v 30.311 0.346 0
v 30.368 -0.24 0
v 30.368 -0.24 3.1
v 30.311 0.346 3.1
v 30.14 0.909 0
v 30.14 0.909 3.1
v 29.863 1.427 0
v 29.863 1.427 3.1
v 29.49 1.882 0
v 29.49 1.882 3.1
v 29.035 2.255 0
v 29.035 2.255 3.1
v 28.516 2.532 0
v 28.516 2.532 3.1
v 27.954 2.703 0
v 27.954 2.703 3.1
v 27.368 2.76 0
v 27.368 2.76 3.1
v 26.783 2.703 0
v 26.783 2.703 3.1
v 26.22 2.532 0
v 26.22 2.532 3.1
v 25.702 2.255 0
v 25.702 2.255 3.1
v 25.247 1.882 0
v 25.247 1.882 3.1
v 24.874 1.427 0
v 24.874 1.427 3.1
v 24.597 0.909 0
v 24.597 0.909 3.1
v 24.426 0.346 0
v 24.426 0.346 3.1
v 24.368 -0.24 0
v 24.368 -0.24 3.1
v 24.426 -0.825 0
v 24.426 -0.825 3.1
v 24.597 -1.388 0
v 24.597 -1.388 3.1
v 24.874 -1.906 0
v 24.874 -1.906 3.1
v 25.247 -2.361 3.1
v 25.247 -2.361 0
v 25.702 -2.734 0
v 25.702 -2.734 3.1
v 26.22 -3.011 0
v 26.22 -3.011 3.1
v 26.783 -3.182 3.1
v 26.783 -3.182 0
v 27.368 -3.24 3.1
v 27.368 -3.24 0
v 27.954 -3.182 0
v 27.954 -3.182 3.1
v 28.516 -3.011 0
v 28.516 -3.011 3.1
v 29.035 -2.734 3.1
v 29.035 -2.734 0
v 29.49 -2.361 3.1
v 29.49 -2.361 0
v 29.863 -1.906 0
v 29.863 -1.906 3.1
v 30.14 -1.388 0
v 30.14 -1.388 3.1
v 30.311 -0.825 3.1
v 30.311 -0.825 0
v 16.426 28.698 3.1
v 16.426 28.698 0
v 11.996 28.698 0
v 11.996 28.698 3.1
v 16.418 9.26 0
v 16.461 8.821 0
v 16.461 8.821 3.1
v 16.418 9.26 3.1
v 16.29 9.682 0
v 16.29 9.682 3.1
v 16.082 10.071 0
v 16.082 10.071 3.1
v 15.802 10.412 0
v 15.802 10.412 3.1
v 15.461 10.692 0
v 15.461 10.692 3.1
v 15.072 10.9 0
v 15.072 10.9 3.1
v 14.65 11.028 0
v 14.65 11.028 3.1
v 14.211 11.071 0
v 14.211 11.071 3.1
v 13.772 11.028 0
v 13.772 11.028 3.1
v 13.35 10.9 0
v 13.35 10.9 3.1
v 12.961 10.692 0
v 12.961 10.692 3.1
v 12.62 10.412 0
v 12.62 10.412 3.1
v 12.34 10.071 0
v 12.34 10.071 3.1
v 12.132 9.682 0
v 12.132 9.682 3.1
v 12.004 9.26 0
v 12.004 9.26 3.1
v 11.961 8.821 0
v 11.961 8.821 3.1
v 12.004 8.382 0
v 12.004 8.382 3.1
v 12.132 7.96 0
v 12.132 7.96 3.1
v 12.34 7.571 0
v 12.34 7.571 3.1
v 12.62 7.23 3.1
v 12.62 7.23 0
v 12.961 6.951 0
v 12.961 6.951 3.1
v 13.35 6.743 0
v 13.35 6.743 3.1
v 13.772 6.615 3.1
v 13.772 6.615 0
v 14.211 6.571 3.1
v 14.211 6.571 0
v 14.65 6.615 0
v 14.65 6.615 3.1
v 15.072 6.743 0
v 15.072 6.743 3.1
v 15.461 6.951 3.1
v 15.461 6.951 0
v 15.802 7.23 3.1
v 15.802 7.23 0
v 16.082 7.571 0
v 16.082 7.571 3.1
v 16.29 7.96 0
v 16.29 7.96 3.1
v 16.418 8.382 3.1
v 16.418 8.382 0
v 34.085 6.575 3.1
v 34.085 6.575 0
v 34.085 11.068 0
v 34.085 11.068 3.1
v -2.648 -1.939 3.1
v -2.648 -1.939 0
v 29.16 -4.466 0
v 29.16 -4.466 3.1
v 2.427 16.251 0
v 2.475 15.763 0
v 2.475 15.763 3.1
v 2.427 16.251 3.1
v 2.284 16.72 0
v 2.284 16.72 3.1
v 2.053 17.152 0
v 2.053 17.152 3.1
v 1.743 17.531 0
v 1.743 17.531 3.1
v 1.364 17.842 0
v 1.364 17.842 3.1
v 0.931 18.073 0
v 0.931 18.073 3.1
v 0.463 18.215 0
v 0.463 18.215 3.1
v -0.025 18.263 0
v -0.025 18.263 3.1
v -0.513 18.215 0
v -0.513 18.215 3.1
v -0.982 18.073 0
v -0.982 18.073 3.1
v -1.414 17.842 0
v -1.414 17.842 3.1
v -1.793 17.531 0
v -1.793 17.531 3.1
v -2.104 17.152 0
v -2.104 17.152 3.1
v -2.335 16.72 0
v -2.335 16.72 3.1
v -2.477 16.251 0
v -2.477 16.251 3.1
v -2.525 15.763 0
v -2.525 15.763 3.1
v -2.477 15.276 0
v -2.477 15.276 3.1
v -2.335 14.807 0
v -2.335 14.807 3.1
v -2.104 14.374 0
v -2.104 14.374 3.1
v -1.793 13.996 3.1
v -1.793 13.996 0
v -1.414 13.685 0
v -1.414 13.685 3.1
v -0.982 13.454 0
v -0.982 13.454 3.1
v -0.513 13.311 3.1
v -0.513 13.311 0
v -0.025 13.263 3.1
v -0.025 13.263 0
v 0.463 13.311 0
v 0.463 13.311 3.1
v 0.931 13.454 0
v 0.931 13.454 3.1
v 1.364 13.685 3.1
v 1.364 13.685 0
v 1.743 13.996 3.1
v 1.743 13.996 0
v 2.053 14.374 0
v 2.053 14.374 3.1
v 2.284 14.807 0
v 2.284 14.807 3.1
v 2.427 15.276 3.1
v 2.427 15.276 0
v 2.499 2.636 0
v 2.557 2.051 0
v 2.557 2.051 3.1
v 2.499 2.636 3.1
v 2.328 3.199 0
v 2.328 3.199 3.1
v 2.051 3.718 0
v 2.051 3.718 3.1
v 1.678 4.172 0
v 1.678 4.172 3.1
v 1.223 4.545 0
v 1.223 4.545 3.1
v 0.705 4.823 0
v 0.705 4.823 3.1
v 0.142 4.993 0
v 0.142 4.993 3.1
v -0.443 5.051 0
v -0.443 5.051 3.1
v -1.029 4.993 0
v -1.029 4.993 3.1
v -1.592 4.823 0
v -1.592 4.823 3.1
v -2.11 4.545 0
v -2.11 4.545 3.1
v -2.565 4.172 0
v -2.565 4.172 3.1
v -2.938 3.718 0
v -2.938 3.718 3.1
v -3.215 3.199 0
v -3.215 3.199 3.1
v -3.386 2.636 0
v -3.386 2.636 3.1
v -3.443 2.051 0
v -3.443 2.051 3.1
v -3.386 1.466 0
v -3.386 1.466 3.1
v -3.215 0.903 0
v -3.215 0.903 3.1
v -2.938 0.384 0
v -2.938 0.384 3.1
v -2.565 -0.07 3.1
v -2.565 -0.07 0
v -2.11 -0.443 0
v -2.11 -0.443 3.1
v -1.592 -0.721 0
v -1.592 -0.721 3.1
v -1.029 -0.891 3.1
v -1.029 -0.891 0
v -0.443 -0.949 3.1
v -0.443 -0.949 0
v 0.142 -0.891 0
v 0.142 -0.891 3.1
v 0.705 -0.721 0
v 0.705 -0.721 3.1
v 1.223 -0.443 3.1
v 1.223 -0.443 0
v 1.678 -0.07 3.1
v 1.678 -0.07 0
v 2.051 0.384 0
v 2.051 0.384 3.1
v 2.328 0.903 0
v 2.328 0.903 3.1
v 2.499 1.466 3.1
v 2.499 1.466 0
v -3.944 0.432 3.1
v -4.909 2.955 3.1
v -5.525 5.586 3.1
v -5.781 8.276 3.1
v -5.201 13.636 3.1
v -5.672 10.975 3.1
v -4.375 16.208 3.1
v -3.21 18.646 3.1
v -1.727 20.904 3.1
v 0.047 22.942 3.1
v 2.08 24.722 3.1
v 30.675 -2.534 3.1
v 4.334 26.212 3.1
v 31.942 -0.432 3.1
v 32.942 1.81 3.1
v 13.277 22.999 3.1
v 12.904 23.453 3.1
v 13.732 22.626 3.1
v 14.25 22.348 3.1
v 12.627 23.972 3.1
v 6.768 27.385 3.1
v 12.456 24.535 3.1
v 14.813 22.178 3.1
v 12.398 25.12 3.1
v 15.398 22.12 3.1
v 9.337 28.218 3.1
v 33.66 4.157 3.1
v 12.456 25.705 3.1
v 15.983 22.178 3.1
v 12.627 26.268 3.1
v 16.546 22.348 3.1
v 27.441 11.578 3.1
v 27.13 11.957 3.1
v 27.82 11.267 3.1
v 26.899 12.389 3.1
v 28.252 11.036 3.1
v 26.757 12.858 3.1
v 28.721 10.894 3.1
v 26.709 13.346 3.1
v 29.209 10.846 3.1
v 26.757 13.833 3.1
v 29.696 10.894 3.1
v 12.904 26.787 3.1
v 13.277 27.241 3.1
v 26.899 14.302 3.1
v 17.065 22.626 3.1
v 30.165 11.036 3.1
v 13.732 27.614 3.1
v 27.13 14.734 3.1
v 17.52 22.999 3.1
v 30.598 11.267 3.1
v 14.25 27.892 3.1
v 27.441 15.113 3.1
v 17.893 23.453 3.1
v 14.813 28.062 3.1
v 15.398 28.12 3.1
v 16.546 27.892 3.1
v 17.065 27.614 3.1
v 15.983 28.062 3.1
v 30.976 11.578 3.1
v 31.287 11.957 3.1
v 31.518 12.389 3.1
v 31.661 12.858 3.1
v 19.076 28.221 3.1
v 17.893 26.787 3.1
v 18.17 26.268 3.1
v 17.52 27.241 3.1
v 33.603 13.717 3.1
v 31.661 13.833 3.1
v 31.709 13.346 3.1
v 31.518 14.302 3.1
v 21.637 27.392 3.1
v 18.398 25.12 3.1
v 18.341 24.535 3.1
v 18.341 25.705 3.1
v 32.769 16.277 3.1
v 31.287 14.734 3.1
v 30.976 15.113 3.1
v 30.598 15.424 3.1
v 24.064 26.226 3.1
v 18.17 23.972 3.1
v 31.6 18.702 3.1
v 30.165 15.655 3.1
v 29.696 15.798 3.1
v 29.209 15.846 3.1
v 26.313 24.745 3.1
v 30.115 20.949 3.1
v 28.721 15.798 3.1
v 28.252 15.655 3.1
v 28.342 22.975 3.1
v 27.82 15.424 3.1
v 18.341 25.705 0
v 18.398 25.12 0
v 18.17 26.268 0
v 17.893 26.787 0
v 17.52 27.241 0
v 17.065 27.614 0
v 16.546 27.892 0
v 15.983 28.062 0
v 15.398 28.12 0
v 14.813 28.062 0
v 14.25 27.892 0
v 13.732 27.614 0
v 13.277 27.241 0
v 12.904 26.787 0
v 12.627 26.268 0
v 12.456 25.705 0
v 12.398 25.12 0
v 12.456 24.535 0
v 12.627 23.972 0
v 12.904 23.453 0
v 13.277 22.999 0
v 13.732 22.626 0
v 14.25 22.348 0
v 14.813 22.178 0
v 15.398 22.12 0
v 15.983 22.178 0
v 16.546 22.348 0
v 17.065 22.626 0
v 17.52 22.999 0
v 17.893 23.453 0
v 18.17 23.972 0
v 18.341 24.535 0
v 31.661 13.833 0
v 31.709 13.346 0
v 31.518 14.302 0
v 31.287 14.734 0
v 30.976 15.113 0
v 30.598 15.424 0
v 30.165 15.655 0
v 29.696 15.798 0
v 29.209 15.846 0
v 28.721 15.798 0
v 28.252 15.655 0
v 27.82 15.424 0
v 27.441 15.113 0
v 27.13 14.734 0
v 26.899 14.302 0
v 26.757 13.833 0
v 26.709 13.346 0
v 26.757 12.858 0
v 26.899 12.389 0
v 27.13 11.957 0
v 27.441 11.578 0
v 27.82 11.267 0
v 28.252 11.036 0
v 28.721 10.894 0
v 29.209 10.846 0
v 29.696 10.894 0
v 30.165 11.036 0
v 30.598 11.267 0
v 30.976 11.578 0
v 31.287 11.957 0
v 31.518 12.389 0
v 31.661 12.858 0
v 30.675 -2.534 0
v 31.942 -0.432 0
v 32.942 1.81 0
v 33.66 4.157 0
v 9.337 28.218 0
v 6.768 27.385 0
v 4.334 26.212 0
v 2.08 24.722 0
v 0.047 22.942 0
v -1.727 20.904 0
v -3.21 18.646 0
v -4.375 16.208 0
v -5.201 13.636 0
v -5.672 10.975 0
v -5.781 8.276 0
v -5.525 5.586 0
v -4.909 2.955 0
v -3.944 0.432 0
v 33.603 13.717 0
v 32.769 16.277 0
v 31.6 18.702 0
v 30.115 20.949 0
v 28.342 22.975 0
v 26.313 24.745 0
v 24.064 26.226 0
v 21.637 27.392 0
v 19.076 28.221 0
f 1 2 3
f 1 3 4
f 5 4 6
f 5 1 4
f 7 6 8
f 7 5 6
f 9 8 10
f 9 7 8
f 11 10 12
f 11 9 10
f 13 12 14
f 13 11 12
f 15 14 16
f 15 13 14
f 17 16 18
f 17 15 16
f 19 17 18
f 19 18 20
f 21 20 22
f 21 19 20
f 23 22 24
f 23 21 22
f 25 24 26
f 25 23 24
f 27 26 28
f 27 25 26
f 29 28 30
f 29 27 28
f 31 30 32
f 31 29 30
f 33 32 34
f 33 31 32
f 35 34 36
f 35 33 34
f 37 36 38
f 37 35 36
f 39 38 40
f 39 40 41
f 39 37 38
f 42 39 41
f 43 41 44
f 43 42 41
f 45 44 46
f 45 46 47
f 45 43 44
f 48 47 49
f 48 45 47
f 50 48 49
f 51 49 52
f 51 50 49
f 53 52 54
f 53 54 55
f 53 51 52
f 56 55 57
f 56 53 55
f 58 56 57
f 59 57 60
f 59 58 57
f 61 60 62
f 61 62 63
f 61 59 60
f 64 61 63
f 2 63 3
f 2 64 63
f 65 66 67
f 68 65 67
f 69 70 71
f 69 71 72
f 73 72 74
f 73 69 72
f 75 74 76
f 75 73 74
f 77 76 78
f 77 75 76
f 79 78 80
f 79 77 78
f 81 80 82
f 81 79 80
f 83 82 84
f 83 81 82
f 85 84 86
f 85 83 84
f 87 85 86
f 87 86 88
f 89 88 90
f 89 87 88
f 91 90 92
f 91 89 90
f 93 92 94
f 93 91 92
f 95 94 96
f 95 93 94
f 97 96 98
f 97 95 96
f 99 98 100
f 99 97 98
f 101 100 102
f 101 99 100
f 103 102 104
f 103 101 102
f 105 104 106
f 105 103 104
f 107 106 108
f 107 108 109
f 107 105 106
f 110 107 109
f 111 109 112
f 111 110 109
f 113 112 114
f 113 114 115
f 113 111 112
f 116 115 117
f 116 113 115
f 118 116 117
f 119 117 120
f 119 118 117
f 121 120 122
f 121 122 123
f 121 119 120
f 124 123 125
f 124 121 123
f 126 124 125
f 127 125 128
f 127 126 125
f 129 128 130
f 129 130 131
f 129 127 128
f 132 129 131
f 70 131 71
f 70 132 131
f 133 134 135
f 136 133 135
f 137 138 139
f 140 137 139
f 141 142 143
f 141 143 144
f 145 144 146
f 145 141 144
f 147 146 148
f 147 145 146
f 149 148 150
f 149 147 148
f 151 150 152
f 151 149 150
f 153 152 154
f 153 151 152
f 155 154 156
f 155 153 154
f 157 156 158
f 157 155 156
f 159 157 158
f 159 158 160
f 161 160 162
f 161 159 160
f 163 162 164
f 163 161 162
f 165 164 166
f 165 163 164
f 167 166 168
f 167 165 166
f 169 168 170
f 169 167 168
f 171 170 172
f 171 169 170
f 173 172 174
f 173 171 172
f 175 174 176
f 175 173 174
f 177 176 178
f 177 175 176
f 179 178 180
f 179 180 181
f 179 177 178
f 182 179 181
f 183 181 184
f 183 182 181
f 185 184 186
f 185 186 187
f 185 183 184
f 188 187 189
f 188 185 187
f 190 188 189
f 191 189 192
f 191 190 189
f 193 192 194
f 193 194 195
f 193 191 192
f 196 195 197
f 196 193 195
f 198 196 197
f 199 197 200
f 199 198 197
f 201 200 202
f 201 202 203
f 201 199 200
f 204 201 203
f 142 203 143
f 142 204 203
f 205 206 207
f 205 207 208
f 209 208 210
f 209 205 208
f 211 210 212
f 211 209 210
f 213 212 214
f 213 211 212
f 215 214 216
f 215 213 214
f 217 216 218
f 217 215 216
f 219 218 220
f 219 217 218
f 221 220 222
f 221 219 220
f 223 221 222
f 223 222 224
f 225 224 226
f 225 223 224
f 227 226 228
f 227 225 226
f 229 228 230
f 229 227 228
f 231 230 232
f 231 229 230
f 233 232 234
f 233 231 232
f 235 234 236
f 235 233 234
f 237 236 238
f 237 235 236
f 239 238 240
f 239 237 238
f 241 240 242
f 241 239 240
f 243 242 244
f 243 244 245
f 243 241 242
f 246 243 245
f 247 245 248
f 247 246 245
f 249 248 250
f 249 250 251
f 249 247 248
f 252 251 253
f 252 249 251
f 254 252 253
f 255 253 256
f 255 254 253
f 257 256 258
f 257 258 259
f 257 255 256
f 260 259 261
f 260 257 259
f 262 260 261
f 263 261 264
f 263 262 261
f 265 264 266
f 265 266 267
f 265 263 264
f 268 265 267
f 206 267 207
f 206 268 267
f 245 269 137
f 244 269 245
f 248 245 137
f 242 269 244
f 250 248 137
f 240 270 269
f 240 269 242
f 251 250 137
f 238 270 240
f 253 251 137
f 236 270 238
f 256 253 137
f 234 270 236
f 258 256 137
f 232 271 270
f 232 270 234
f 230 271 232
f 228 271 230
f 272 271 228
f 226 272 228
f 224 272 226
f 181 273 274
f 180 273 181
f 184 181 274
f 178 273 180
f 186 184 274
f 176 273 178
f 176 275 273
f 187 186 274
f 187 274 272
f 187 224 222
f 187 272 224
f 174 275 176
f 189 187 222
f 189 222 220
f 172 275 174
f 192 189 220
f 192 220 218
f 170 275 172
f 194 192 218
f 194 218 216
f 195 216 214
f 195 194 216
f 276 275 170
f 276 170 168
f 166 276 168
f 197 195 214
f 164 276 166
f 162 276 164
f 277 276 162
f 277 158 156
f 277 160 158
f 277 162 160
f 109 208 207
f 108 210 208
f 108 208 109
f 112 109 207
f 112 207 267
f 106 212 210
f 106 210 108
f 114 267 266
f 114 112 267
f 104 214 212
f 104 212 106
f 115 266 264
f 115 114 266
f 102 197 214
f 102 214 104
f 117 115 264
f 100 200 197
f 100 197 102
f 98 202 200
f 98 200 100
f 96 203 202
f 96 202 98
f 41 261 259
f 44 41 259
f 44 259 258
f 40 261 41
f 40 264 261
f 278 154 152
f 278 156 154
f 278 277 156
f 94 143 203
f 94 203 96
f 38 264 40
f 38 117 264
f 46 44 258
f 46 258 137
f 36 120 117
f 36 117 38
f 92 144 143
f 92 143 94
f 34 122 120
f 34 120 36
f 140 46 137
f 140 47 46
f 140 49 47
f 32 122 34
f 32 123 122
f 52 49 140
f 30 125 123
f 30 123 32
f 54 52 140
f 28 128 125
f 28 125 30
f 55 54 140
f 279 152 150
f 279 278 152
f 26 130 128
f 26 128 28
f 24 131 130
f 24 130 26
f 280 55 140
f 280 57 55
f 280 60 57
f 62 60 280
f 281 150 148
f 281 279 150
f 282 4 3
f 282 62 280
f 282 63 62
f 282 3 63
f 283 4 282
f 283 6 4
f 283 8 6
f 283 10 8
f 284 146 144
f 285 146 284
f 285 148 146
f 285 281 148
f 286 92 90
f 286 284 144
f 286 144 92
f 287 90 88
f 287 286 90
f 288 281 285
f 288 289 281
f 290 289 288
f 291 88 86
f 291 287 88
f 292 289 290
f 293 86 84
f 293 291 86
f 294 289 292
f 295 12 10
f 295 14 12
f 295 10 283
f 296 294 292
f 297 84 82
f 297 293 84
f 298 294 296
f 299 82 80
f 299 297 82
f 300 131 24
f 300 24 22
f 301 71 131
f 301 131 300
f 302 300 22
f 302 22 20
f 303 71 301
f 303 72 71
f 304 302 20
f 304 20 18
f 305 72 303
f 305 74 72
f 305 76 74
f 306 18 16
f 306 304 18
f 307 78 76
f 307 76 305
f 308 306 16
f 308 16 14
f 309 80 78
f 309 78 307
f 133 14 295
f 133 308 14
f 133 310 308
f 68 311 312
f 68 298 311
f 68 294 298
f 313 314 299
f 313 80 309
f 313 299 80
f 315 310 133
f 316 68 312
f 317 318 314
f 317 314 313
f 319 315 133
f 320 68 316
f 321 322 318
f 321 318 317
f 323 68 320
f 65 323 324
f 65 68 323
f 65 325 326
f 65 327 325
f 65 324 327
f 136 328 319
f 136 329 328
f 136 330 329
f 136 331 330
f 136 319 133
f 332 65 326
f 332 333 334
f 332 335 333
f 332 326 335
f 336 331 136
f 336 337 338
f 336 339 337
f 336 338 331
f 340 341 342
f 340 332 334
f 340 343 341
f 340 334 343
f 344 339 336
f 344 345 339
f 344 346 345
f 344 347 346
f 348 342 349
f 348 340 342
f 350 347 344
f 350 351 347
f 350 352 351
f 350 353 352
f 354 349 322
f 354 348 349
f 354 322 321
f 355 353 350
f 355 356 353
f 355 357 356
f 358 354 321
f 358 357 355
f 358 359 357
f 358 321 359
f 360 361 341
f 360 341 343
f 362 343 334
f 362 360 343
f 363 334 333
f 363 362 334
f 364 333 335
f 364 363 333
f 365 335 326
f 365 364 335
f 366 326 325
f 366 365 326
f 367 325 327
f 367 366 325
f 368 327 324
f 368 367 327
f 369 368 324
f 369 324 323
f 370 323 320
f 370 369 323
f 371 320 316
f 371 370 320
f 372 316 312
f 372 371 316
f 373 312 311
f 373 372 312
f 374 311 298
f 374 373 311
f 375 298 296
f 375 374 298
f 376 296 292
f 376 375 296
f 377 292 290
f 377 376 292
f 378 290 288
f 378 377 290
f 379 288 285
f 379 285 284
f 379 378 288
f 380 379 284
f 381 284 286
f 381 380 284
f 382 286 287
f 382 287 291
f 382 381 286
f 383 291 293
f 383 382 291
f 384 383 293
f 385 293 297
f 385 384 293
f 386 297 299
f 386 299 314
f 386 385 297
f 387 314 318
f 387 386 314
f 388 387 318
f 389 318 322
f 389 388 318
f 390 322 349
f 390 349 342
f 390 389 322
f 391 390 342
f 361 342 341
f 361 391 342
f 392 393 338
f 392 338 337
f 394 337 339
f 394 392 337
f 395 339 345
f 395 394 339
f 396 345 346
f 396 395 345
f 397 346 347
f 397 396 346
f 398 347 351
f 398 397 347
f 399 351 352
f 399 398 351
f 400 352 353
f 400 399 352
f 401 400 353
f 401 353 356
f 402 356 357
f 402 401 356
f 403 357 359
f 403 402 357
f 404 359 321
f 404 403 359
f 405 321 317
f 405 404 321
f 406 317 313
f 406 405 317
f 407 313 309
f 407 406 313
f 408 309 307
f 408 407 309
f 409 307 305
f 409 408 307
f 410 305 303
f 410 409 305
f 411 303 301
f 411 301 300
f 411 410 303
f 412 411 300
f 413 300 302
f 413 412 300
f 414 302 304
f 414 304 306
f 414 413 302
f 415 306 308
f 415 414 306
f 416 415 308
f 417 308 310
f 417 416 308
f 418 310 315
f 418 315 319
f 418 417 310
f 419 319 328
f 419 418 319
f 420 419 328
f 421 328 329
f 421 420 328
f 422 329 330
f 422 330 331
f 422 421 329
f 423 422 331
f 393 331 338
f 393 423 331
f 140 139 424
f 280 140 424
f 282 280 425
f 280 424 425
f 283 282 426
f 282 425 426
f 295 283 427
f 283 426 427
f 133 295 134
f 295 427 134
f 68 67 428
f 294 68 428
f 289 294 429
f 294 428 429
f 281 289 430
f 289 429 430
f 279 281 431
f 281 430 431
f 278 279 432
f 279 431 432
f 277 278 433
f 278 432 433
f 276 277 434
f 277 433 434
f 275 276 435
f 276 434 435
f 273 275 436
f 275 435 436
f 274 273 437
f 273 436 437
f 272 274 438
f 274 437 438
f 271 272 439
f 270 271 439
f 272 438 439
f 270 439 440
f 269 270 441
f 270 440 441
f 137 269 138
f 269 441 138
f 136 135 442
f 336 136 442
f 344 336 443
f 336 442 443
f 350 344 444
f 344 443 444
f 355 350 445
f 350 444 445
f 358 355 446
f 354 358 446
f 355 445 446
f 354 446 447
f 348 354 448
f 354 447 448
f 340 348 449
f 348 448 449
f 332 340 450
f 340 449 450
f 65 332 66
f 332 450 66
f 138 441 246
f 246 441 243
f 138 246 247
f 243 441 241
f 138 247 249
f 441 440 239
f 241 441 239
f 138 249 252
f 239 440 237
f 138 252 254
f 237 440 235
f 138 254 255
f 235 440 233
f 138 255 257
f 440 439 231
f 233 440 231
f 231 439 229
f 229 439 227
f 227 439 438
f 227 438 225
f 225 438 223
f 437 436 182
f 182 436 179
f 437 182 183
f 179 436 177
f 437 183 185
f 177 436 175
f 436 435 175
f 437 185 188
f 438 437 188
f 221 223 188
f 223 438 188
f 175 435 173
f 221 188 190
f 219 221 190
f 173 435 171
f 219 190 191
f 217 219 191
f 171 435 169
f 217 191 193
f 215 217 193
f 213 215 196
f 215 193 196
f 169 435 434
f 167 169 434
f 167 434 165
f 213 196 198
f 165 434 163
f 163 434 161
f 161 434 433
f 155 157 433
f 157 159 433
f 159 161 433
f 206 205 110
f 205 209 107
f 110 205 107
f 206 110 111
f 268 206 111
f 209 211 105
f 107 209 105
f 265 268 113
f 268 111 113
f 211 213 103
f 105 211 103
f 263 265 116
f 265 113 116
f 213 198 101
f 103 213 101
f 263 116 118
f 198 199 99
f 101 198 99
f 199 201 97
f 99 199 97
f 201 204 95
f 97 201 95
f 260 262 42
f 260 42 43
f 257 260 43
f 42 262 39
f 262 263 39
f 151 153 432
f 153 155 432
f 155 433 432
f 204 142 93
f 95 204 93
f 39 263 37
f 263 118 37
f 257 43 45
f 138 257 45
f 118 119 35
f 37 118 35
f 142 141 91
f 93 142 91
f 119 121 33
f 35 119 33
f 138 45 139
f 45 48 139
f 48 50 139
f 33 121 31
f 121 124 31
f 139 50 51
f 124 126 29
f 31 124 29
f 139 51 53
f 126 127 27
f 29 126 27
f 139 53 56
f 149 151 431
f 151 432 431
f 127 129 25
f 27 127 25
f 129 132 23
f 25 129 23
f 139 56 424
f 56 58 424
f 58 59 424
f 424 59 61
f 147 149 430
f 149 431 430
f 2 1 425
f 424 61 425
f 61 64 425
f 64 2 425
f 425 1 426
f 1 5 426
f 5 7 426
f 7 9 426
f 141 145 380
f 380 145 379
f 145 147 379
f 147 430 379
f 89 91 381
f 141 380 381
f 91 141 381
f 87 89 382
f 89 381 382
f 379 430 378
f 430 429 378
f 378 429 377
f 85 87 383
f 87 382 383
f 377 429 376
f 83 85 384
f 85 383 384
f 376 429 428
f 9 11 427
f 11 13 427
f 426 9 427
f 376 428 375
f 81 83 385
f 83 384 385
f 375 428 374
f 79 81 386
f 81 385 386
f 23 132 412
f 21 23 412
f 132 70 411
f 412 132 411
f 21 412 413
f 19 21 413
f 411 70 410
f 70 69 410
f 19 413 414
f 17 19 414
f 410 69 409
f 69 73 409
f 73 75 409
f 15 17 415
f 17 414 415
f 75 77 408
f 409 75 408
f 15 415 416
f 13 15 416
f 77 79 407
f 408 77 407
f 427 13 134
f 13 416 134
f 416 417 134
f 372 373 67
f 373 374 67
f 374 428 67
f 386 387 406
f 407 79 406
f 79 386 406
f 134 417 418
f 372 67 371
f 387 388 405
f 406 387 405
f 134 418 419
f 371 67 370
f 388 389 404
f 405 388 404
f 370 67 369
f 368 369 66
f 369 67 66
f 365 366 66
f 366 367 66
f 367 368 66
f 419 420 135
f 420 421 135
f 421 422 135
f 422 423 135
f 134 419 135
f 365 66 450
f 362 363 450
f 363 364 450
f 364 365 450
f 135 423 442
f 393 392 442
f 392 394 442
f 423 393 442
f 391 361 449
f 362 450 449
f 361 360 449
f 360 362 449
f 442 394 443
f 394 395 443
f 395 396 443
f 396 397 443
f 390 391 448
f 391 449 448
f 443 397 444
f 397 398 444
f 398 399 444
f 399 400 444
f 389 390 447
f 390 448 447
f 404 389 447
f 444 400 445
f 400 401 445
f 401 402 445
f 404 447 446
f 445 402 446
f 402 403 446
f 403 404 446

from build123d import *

# Parameters (mm, degrees)
F0_R     = 3
F0_R_2   = 2.5
F0_R_3   = 2.25
F1_DEPTH = 3.1


with BuildPart() as f1:
    # F0 (on Top) → F1 (new body)
    with BuildSketch(Plane.XY):
        with BuildLine():
            ThreePointArc((29.159625, -4.46566), (32.476252, 0.673465), (34.084613, 6.574635))
            Line((34.084613, 6.574635), (34.084613, 11.068079))
            ThreePointArc((34.084613, 11.068079), (28.342014, 22.974813), (16.426098, 28.698335))
            Line((16.426098, 28.698335), (11.996317, 28.698335))
            ThreePointArc((11.996317, 28.698335), (-3.833381, 17.446484), (-2.647776, -1.938506))
            Line((-2.647776, -1.938506), (29.159625, -4.46566))
        make_face()
        with Locations((-0.443478, 2.051086)):
            Circle(F0_R, mode=Mode.SUBTRACT)
        with Locations((27.368436, -0.239537)):
            Circle(F0_R, mode=Mode.SUBTRACT)
        with Locations((-0.025214, 15.76334)):
            Circle(F0_R_2, mode=Mode.SUBTRACT)
        with Locations((14.211208, 8.821357)):
            Circle(F0_R_3, mode=Mode.SUBTRACT)
        with Locations((29.20861, 13.34557)):
            Circle(F0_R_2, mode=Mode.SUBTRACT)
        with Locations((15.398228, 25.120057)):
            Circle(F0_R, mode=Mode.SUBTRACT)
    extrude(amount=F1_DEPTH)


solid = f1.part
